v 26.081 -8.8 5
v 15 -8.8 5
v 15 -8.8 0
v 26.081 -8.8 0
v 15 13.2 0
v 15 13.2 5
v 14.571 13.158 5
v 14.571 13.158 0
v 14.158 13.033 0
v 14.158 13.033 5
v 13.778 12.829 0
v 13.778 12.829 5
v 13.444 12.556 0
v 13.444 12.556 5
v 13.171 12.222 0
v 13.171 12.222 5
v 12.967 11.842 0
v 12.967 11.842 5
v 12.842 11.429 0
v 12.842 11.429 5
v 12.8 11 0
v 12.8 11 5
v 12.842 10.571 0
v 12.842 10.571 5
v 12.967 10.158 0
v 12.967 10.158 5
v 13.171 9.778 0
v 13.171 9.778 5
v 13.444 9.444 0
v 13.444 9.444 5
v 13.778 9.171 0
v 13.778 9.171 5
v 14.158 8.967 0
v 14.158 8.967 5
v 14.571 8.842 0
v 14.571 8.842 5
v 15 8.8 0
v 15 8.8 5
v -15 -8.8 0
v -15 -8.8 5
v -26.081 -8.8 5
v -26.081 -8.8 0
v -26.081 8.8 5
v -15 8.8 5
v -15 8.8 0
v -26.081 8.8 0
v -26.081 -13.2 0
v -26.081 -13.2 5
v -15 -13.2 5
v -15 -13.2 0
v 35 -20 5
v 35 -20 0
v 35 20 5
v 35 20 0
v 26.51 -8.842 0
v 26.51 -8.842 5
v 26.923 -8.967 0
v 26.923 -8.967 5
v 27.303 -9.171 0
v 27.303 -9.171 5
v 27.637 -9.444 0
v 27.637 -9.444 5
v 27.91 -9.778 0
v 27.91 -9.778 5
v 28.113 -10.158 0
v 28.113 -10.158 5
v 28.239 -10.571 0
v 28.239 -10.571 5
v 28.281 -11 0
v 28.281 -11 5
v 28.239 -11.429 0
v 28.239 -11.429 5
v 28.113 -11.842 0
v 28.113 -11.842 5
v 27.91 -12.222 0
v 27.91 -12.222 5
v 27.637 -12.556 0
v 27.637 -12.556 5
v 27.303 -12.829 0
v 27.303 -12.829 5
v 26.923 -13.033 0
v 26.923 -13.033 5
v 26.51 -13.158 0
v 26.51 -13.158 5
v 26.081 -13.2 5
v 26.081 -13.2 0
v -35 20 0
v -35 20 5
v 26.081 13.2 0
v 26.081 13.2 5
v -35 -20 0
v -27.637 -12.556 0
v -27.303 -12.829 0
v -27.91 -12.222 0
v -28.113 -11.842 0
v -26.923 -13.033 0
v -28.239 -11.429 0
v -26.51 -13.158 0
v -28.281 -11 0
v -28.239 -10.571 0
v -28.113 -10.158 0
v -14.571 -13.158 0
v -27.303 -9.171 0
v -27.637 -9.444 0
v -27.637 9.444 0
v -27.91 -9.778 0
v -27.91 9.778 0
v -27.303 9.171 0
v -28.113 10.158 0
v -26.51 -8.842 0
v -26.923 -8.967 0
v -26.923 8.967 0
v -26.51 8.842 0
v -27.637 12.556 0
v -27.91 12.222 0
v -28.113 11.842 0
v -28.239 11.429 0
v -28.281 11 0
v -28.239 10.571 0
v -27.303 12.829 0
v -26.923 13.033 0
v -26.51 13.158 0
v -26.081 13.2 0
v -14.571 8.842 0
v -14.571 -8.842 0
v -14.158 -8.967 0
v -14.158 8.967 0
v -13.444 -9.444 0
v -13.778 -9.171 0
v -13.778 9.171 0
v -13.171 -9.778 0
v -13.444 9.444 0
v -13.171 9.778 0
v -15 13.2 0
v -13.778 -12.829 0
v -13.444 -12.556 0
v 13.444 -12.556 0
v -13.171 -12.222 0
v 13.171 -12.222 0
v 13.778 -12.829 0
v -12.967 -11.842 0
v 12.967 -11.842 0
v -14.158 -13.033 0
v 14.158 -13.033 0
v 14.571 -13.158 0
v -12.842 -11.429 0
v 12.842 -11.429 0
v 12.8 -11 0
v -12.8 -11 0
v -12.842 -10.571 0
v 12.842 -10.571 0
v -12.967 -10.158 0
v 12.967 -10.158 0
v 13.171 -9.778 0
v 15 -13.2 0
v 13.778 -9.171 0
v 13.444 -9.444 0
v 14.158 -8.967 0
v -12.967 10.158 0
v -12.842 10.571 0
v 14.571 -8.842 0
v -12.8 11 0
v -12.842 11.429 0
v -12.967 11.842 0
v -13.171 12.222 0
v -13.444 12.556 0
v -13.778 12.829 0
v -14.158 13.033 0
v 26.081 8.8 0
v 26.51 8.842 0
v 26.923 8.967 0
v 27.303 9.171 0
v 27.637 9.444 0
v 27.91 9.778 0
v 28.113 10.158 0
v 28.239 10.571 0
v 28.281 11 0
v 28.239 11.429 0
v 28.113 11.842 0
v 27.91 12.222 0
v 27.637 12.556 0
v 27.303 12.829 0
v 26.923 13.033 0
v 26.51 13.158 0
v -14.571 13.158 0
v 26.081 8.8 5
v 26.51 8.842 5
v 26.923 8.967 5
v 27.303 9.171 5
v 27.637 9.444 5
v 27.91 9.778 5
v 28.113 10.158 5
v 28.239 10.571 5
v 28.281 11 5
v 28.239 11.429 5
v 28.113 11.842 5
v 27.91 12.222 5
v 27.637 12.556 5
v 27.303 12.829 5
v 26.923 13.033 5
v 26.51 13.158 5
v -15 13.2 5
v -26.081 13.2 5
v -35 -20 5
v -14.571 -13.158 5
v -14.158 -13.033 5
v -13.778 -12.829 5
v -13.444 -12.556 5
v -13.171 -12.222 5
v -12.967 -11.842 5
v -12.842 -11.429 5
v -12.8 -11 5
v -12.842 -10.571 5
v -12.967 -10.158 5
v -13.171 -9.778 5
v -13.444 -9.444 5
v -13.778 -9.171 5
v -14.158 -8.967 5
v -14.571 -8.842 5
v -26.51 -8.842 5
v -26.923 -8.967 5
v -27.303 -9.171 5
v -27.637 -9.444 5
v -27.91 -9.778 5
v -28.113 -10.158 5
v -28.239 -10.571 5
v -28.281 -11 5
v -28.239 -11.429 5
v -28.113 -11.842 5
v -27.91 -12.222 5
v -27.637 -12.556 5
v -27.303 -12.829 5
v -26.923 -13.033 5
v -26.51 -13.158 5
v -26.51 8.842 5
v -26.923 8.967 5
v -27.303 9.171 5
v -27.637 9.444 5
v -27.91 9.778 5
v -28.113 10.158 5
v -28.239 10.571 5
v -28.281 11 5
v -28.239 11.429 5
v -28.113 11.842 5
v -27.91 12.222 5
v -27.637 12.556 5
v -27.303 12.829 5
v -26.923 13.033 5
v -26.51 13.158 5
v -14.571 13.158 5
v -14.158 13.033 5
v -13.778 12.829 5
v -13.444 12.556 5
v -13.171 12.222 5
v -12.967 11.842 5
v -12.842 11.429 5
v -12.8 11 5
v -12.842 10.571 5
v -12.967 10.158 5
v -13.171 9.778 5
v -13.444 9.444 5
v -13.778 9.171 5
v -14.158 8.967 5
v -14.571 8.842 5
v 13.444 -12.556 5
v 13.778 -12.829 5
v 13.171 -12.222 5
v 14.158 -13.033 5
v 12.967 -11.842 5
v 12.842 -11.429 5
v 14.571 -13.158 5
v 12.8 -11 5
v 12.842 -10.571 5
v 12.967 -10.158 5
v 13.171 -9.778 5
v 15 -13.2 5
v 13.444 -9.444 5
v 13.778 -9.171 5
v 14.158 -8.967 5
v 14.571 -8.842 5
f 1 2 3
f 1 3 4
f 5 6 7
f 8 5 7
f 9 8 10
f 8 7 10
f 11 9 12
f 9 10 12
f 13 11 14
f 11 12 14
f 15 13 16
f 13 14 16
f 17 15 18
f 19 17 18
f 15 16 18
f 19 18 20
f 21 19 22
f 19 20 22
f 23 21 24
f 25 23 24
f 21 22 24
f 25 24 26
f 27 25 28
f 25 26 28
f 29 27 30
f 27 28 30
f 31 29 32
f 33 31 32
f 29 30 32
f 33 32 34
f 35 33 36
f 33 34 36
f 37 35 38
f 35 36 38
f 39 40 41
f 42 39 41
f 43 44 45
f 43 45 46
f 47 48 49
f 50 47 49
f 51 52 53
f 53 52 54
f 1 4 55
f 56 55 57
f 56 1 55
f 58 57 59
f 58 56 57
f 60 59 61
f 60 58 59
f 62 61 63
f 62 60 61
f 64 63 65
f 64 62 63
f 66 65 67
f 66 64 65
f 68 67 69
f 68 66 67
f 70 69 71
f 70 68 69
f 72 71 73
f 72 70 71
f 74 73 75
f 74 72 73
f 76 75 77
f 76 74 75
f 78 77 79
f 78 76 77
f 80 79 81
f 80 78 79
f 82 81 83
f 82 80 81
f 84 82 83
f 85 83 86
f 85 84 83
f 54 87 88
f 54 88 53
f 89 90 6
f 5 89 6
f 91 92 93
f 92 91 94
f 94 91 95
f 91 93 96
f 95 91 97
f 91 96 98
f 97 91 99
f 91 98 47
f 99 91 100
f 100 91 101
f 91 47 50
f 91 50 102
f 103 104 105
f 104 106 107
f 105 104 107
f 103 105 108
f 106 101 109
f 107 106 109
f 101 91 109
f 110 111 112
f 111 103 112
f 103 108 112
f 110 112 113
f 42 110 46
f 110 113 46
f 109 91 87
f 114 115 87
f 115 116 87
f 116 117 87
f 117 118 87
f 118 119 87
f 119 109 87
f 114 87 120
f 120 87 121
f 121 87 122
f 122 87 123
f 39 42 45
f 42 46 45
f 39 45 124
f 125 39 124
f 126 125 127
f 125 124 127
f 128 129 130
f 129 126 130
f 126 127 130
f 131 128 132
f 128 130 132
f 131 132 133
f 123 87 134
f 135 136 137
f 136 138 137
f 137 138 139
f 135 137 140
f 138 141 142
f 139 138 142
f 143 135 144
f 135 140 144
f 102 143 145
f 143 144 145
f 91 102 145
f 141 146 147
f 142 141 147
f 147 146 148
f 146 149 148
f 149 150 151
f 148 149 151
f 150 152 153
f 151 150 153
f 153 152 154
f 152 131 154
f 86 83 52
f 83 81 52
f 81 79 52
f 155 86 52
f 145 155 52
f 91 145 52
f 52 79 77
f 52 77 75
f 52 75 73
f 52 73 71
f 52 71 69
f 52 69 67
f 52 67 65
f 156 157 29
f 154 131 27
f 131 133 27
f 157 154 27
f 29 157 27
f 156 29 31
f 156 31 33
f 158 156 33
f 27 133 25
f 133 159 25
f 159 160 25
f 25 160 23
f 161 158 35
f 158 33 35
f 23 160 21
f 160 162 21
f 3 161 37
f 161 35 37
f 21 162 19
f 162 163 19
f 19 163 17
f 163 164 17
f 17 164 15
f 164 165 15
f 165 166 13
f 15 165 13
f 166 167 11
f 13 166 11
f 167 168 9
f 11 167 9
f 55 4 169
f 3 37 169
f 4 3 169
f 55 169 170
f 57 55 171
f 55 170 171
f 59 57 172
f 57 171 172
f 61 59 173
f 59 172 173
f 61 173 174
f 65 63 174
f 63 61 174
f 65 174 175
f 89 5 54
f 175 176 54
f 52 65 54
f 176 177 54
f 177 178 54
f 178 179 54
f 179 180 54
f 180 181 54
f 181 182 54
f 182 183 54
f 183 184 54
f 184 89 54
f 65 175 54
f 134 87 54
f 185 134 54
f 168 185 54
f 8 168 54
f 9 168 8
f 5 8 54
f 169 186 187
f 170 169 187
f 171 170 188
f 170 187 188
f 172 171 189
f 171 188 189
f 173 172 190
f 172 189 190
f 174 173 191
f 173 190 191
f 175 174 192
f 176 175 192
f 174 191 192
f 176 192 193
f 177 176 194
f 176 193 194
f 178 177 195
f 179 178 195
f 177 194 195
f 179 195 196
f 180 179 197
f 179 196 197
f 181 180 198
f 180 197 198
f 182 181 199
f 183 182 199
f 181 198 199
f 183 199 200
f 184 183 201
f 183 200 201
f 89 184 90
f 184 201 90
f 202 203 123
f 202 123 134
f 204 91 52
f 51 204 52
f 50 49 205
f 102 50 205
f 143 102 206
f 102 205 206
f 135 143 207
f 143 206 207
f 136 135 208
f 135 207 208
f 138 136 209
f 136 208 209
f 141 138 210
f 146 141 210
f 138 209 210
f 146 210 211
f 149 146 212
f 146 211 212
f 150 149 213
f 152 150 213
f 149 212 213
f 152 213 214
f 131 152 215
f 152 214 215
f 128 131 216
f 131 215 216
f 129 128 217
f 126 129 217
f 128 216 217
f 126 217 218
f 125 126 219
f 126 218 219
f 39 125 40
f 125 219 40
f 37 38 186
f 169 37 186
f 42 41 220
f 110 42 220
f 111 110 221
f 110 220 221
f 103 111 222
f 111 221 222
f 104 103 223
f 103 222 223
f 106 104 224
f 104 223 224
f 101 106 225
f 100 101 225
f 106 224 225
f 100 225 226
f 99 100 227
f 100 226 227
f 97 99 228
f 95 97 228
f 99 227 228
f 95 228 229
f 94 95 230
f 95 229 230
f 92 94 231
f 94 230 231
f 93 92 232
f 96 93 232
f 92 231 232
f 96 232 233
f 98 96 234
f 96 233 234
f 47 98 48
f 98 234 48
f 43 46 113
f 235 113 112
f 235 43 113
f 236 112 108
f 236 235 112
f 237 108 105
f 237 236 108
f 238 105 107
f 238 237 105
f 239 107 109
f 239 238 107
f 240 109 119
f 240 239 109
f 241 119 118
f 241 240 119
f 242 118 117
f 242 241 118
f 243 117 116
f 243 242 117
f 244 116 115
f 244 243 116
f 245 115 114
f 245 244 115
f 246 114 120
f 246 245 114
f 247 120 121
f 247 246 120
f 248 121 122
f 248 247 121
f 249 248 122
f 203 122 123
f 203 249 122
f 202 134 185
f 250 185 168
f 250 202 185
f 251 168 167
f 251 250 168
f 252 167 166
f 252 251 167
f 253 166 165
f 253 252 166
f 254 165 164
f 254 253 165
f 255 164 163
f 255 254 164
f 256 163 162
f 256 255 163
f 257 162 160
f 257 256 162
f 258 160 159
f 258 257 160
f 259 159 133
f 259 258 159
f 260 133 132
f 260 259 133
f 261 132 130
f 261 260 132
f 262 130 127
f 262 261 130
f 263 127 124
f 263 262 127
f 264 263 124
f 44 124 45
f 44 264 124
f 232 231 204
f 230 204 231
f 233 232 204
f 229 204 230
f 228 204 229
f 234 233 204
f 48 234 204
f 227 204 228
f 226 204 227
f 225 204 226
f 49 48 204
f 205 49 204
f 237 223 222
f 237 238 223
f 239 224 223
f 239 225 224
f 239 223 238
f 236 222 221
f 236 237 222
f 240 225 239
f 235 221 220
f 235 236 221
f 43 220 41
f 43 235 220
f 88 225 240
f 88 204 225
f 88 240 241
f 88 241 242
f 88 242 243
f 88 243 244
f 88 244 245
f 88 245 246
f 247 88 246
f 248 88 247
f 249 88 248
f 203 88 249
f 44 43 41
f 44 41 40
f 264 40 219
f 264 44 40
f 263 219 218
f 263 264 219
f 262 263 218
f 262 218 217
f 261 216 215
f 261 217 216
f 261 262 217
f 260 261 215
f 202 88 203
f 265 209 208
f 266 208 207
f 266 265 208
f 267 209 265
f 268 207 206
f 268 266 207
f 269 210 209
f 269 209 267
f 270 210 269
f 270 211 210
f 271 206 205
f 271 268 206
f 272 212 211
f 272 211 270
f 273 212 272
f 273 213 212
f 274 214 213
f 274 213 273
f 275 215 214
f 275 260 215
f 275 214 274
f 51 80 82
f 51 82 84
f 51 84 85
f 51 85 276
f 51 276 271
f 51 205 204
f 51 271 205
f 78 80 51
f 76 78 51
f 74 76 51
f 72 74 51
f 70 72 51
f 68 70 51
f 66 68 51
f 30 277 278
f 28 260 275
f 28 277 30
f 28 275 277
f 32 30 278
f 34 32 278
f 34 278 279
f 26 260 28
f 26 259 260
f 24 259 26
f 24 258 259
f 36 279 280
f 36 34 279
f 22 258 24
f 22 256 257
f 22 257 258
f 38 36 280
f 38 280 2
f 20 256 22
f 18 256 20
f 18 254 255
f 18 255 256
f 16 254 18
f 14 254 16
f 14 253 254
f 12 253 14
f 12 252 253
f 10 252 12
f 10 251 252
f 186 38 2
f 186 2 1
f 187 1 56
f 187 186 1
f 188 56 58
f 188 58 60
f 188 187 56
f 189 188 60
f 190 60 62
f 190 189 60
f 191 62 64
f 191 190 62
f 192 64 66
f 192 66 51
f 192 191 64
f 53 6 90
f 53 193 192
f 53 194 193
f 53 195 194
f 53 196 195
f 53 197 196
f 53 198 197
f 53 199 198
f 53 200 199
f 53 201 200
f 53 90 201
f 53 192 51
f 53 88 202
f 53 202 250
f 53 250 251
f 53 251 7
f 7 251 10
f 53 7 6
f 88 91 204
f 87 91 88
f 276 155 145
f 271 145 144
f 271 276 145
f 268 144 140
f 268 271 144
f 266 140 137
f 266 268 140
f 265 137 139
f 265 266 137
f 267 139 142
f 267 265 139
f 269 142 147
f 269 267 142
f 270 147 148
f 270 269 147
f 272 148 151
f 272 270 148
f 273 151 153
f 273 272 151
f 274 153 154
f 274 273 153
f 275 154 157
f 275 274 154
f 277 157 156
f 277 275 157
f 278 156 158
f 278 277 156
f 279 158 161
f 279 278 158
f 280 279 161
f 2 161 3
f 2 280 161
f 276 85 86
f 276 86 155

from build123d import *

# Parameters (mm, degrees)
SKETCH1_W            = 70
SKETCH1_H            = 40
BOSS_EXTRUDE1_DEPTH  = 5
CUT_EXTRUDE1_DEPTH   = 41.620192023
MIRROR3_COPY_1_DEPTH = 41.620192023
MIRROR3_COPY_2_DEPTH = 41.620192023


with BuildPart() as part:
    # Sketch1 → Boss-Extrude1 (new body)
    with BuildSketch(Plane.XY):
        Rectangle(SKETCH1_W, SKETCH1_H)
    extrude(amount=BOSS_EXTRUDE1_DEPTH)

    # Sketch3 → Cut-Extrude1 (cut, through all)
    with BuildSketch(Plane.XY.offset(5)):
        with BuildLine():
            Line((-26.080867749, 13.2), (-15, 13.2))
            ThreePointArc((-15, 13.2), (-12.8, 11), (-15, 8.8))
            Line((-15, 8.8), (-26.080867749, 8.8))
            ThreePointArc((-26.080867749, 8.8), (-28.280867749, 11), (-26.080867749, 13.2))
        make_face()
    cut_extrude1 = extrude(amount=-CUT_EXTRUDE1_DEPTH, mode=Mode.SUBTRACT)

    # Mirror2: Cut-Extrude1 across plane
    add(cut_extrude1.mirror(Plane(origin=(0, 0, 0), x_dir=(0, 0, 1), z_dir=(1, 0, 0))), mode=Mode.SUBTRACT)

    # Mirror3 copy 1 sketch → Mirror3 copy 1 (cut, through all)
    with BuildSketch(Plane(origin=(0, 0, 5), x_dir=(-1, 0, 0), z_dir=(0, 0, 1))):
        with BuildLine():
            Line((-26.080867749, 13.2), (-15, 13.2))
            ThreePointArc((-15, 13.2), (-12.8, 11), (-15, 8.8))
            Line((-15, 8.8), (-26.080867749, 8.8))
            ThreePointArc((-26.080867749, 8.8), (-28.280867749, 11), (-26.080867749, 13.2))
        make_face()
    extrude(amount=-MIRROR3_COPY_1_DEPTH, mode=Mode.SUBTRACT)

    # Mirror3 copy 2 sketch → Mirror3 copy 2 (cut, through all)
    with BuildSketch(Plane.XY.offset(5)):
        with BuildLine():
            Line((-26.080867749, -13.2), (-15, -13.2))
            ThreePointArc((-15, -13.2), (-12.8, -11), (-15, -8.8))
            Line((-15, -8.8), (-26.080867749, -8.8))
            ThreePointArc((-26.080867749, -8.8), (-28.280867749, -11), (-26.080867749, -13.2))
        make_face()
    extrude(amount=-MIRROR3_COPY_2_DEPTH, mode=Mode.SUBTRACT)


solid = part.part
